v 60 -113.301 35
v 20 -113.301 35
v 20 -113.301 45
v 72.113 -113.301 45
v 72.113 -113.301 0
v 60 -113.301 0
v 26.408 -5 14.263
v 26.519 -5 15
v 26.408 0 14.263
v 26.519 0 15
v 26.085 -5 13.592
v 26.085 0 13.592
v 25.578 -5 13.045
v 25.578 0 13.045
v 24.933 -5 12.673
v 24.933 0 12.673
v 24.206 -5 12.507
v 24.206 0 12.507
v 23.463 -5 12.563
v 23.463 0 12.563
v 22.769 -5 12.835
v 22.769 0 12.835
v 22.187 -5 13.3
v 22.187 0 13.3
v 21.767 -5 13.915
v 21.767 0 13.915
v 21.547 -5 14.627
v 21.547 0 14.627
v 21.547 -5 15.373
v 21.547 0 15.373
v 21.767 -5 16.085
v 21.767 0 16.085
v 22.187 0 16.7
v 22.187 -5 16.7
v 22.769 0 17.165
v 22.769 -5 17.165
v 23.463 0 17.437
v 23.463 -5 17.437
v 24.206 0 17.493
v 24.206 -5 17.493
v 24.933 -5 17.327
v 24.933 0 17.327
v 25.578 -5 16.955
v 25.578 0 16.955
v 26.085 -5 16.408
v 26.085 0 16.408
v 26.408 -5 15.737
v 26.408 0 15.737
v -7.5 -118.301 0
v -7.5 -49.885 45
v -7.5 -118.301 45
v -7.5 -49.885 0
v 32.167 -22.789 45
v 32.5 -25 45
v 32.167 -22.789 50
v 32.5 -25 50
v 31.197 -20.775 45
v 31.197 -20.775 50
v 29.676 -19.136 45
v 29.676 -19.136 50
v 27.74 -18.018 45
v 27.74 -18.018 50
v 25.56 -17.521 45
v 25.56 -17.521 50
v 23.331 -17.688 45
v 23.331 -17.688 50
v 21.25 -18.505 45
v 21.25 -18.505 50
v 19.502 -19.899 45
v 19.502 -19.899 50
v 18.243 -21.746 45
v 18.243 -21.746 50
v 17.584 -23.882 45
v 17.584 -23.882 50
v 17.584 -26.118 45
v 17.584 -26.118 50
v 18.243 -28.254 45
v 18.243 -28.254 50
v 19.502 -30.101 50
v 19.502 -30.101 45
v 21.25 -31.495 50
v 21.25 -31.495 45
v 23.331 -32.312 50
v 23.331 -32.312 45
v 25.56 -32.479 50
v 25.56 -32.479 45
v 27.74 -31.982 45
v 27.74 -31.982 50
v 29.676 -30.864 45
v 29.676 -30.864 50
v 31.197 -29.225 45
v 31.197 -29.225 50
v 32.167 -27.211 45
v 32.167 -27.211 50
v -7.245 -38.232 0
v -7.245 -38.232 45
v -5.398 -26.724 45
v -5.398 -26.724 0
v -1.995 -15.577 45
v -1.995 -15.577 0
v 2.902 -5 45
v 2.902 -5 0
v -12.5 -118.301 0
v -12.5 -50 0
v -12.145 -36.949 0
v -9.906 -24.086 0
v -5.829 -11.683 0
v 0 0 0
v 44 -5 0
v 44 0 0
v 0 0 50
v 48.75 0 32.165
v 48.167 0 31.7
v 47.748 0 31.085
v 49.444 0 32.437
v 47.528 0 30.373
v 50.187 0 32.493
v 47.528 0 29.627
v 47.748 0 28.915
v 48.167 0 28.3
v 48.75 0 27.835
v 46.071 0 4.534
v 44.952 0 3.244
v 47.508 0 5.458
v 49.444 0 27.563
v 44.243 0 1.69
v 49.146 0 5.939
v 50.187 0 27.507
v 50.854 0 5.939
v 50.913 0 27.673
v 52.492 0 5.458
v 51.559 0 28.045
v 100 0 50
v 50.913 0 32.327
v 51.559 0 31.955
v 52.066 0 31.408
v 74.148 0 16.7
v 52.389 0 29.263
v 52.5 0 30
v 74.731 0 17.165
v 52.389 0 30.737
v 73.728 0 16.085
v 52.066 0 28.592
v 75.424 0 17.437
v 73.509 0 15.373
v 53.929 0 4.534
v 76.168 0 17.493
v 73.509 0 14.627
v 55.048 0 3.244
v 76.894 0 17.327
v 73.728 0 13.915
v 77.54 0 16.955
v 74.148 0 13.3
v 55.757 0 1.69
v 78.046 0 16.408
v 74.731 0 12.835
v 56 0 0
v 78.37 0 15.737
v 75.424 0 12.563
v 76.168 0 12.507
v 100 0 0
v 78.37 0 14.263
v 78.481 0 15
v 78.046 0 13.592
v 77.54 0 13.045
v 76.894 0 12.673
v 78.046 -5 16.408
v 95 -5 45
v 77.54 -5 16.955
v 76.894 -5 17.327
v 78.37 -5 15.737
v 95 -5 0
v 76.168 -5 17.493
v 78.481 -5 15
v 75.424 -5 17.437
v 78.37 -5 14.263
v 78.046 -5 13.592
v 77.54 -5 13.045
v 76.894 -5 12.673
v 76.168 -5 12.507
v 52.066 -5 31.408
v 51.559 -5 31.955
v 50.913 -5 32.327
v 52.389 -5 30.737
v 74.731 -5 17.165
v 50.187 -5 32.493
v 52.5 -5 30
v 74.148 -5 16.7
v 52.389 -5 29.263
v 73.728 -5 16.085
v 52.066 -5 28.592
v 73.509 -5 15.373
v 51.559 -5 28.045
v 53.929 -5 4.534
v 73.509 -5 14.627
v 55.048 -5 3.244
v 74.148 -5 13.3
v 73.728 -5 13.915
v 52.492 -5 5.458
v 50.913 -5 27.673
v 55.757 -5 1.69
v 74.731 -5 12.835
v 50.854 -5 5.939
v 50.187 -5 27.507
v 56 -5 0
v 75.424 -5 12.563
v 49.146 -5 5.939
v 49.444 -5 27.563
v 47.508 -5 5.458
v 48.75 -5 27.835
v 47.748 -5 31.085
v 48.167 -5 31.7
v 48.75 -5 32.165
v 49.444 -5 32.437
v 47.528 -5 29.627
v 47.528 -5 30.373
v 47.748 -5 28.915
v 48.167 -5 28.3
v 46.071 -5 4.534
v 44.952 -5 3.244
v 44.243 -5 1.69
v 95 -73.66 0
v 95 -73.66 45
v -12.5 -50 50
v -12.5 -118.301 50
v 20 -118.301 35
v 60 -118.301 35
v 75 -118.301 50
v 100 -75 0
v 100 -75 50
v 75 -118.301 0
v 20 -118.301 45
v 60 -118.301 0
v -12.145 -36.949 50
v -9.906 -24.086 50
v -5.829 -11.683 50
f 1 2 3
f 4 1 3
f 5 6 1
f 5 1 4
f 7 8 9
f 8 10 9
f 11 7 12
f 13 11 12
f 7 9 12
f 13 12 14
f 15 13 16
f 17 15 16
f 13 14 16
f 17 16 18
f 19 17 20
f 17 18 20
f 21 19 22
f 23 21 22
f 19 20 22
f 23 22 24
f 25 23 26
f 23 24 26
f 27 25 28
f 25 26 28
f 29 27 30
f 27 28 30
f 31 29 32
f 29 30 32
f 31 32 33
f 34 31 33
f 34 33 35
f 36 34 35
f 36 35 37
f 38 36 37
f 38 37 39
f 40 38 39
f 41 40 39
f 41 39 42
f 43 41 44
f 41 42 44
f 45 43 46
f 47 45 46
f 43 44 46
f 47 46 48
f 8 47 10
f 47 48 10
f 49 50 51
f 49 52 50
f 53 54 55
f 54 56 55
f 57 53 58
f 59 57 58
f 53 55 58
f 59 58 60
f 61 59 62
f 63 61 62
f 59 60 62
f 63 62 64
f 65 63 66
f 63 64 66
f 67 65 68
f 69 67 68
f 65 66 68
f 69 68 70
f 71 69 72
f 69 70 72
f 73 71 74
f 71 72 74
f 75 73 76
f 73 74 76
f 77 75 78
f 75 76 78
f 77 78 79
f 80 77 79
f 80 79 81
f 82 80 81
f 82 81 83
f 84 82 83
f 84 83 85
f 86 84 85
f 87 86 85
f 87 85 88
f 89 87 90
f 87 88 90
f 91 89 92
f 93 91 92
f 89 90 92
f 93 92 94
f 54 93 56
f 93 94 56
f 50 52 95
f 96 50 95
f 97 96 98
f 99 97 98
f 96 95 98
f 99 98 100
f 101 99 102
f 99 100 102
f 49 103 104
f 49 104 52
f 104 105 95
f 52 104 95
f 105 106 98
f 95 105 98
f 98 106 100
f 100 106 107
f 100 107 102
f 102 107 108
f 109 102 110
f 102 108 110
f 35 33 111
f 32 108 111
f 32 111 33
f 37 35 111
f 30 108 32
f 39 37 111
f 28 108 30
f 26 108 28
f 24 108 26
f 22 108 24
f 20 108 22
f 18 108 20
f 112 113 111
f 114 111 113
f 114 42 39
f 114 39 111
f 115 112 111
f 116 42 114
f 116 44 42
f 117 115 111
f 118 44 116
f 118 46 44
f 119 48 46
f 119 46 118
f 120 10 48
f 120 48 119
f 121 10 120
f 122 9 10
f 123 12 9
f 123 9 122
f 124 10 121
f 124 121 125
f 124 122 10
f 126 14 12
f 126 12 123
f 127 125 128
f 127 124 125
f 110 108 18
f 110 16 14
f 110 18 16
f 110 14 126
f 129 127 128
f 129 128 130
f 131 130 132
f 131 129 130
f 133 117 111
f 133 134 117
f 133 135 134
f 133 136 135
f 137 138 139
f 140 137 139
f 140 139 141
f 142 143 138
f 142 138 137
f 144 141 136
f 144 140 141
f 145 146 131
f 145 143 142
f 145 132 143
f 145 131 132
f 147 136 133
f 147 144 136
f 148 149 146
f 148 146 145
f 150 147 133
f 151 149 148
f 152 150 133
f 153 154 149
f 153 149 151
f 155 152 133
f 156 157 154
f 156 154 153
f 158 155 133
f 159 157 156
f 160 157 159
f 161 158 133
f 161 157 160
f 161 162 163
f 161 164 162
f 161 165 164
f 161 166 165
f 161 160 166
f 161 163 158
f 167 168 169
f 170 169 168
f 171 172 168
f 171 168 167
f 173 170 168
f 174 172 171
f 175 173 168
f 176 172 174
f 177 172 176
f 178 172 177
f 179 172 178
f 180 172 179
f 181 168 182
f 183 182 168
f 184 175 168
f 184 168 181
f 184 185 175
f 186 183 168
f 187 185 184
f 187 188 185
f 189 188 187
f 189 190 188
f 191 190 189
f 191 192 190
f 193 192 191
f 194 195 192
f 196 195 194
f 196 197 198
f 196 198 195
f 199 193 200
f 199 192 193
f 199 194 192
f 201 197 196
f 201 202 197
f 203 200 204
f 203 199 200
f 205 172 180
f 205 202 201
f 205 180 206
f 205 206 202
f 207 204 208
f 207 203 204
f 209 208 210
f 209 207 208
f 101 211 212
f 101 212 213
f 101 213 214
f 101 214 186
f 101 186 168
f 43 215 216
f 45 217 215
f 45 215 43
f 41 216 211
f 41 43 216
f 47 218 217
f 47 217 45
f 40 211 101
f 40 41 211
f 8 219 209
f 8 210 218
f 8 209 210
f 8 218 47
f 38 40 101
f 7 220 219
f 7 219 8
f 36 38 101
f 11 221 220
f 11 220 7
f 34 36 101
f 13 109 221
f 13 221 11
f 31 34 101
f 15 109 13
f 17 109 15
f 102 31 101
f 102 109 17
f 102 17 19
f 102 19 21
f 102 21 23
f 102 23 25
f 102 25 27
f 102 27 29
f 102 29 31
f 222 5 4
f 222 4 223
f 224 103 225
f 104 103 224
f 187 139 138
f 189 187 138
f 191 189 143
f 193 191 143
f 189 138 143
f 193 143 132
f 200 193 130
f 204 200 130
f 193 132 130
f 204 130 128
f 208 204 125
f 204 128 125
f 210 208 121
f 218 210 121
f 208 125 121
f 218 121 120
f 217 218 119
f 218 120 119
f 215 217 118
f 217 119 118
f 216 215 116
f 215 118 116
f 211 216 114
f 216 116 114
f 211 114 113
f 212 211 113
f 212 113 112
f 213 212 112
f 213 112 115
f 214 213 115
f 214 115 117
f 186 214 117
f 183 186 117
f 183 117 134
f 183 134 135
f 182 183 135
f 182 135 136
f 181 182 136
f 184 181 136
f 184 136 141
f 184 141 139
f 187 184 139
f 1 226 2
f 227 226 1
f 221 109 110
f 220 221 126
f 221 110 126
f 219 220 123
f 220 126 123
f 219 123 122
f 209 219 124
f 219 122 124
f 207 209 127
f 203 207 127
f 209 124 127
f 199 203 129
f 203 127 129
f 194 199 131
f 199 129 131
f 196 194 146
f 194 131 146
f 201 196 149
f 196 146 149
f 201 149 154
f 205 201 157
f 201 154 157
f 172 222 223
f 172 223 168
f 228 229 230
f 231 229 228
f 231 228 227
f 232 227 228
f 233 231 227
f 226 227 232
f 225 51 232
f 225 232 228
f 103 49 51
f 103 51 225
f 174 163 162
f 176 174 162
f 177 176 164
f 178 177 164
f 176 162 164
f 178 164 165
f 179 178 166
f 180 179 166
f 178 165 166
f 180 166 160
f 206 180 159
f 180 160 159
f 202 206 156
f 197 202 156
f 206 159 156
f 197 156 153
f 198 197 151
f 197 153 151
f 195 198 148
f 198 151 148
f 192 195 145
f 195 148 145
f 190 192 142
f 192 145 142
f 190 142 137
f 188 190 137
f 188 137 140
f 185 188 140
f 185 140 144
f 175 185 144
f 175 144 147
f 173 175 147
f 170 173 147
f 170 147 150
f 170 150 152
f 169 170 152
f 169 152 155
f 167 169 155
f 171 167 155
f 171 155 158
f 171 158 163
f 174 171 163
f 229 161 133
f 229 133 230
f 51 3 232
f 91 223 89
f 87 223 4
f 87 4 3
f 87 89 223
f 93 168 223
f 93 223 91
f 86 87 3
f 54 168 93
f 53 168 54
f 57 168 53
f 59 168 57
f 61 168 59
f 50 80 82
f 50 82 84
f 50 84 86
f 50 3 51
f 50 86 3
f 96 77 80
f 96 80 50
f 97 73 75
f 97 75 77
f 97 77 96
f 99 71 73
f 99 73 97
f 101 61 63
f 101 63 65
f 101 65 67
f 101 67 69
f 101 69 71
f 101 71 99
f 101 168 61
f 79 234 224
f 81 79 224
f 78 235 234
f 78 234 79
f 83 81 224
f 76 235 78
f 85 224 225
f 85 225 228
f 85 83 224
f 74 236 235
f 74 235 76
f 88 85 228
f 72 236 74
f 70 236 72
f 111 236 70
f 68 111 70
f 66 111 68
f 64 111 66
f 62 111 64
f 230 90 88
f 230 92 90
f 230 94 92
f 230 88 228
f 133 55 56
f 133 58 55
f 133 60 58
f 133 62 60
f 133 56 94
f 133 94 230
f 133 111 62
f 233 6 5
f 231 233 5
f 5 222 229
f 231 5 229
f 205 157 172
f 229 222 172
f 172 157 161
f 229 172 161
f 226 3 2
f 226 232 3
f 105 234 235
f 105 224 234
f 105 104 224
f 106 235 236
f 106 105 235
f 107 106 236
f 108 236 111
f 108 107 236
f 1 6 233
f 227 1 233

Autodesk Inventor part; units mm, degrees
ref_plane "YZ Plane" through (0, 0, 0) normal (1, 0, 0) x (0, 1, 0)
ref_plane "XZ Plane" through (0, 0, 0) normal (0, 1, 0) x (-1, 0, 0)
ref_plane "XY Plane" through (0, 0, 0) normal (0, 0, 1) x (1, 0, 0)
sketch "Sketch1" plane through (0, 0, 0) normal (0, 0, 1) x (1, 0, 0)
  line L0 (0, 0) -> (100, 0)
  line L1 (100, 0) -> (100, -75)
  line L2 (100, -75) -> (75, -118.3013)
  line L3 (75, -118.3013) -> (-12.5, -118.3013)
  line L4 (-12.5, -118.3013) -> (-12.5, -50)
  arc A0 (0, 0) -> (-12.5, -50) centre (77.4072, -45.9143) ccw
  dimension "d0" = 100
  dimension "d1" = 75
  dimension "d2" = 50
  dimension "d3" = 150
  dimension "d5" = 50
  dimension "d6" = 12.5
  dimension "d7" = 90
extrude "Extrusion1" add sketch "Sketch1" along normal blind 50
sketch "Sketch2" plane through (0, 0, 0) normal (0, 0, -1) x (-1, 0, 0)
  line L0 (0, 0) -> (-100, 0) projected
  line L1 (-100, 0) -> (-100, -75) projected
  line L2 (-100, -75) -> (-75, -118.3013) projected
  line L3 (-75, -118.3013) -> (12.5, -118.3013) projected
  line L4 (12.5, -118.3013) -> (12.5, -50) projected
  arc A0 (12.5, -50) -> (0, 0) centre (-77.4072, -45.9143) ccw projected
  line L5 (-95, -73.6603) -> (-95, -5)
  line L6 (-95, -5) -> (-2.902, -5)
  arc A1 (7.5, -49.8848) -> (-2.902, -5) centre (-77.4072, -45.9143) ccw
  line L7 (7.5, -49.8848) -> (7.5, -113.3013)
  line L8 (7.5, -113.3013) -> (-72.1132, -113.3013)
  line L9 (-72.1132, -113.3013) -> (-95, -73.6603)
  dimension "d10" = 5
extrude "Extrusion2" cut sketch "Sketch2" against normal blind 45 contours L5 L6 A1 L7 L8 L9
sketch "Sketch3" plane through (0, 0, 0) normal (0, 0, -1) x (-1, 0, 0)
  line L0 (7.5, -113.3013) -> (-72.1132, -113.3013) projected
  line L1 (12.5, -118.3013) -> (-75, -118.3013) projected
  line L2 (7.5, -113.3013) -> (-60, -113.3013)
  line L3 (-60, -113.3013) -> (-60, -118.3013)
  line L4 (-60, -118.3013) -> (7.5, -118.3013)
  line L5 (7.5, -118.3013) -> (7.5, -113.3013)
  point P0 (0, 0)
  dimension "d13" = 15
extrude "Extrusion3" cut sketch "Sketch3" against normal blind 45
sketch "Sketch4" plane through (0, 0, 0) normal (0, 1, 0) x (1, 0, 0)
  circle A0 centre (50, 0) radius 6
  line L0 (0, 0) -> (100, 0) projected
  dimension "d16" = 12
extrude "Extrusion4" cut sketch "Sketch4" against normal through all
sketch "Sketch5" plane through (0, 0, 50) normal (0, 1, 0) x (1, 0, 0)
  arc A0 (44, 50) -> (56, 50) centre (50, 50) ccw projected
  circle A1 centre (50, 50) radius 30 construction
  circle A2 centre (50, 20) radius 2.5
  circle A3 centre (75.9808, 35) radius 2.5
  circle A4 centre (75.9808, 65) radius 2.5
  circle A5 centre (50, 80) radius 2.5
  circle A6 centre (24.0192, 65) radius 2.5
  circle A7 centre (24.0192, 35) radius 2.5
  point P0 (0, 50)
  dimension "d19" = 60
  dimension "d20" = 5
  dimension "d23" = 360
extrude "Extrusion5" cut sketch "Sketch5" against normal blind 5 contours A2 | A3 | A7
sketch "Sketch6" plane through (0, 0, 50) normal (0, 0, 1) x (1, 0, 0)
  circle A0 centre (25, -25) radius 7.5
  point P0 (0, 0)
  dimension "d27" = 15
  dimension "d28" = 25
  dimension "d29" = 25
extrude "Extrusion6" cut sketch "Sketch6" against normal blind 5
sketch "Sketch7" plane through (-12.5, -118.3013, 50) normal (0, -1, 0) x (1, 0, 0)
  line L0 (87.5, 0) -> (112.5, 0) projected
  line L1 (87.5, 0) -> (32.5, 0)
  line L2 (32.5, 0) -> (32.5, -15)
  line L3 (32.5, -15) -> (87.5, -15)
  line L4 (87.5, -15) -> (87.5, 0)
  line L5 (0, -50) -> (0, 0) projected
  point P0 (12.5, -50)
  dimension "d32" = 15
  dimension "d33" = 32.5
extrude "Extrusion7" add sketch "Sketch7" against normal blind 5
properties part number "FA002" material "ABS Plastic"
